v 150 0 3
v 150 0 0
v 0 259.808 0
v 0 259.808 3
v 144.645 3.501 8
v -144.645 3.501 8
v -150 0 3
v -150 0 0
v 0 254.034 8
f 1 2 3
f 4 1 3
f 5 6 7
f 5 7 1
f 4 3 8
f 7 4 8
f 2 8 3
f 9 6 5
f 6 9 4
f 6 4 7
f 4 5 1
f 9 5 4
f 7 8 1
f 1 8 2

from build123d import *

# Parameters (mm, degrees)
F1_DEPTH = 8
F2_SIZE2 = 2.886751
F2_SIZE  = 5
F3_SIZE2 = 3.501038
F3_SIZE  = 5


with BuildPart() as f1:
    # F0 (on Top) → F1 (new body)
    with BuildSketch(Plane.XY):
        Polygon((-150, 0), (150, 0), (0, 259.807621), align=None)
    extrude(amount=F1_DEPTH)

    # F2
    f2_edges = [f1.edges().sort_by_distance(p)[0] for p in [
        (-75, 129.903811, 8),
        (75, 129.903811, 8),
    ]]
    chamfer(f2_edges, length=F2_SIZE, length2=F2_SIZE2)

    # F3
    f3_edges = [f1.edges().sort_by_distance(p)[0] for p in [
        (0, 0, 8),
    ]]
    chamfer(f3_edges, length=F3_SIZE, length2=F3_SIZE2)


solid = f1.part
